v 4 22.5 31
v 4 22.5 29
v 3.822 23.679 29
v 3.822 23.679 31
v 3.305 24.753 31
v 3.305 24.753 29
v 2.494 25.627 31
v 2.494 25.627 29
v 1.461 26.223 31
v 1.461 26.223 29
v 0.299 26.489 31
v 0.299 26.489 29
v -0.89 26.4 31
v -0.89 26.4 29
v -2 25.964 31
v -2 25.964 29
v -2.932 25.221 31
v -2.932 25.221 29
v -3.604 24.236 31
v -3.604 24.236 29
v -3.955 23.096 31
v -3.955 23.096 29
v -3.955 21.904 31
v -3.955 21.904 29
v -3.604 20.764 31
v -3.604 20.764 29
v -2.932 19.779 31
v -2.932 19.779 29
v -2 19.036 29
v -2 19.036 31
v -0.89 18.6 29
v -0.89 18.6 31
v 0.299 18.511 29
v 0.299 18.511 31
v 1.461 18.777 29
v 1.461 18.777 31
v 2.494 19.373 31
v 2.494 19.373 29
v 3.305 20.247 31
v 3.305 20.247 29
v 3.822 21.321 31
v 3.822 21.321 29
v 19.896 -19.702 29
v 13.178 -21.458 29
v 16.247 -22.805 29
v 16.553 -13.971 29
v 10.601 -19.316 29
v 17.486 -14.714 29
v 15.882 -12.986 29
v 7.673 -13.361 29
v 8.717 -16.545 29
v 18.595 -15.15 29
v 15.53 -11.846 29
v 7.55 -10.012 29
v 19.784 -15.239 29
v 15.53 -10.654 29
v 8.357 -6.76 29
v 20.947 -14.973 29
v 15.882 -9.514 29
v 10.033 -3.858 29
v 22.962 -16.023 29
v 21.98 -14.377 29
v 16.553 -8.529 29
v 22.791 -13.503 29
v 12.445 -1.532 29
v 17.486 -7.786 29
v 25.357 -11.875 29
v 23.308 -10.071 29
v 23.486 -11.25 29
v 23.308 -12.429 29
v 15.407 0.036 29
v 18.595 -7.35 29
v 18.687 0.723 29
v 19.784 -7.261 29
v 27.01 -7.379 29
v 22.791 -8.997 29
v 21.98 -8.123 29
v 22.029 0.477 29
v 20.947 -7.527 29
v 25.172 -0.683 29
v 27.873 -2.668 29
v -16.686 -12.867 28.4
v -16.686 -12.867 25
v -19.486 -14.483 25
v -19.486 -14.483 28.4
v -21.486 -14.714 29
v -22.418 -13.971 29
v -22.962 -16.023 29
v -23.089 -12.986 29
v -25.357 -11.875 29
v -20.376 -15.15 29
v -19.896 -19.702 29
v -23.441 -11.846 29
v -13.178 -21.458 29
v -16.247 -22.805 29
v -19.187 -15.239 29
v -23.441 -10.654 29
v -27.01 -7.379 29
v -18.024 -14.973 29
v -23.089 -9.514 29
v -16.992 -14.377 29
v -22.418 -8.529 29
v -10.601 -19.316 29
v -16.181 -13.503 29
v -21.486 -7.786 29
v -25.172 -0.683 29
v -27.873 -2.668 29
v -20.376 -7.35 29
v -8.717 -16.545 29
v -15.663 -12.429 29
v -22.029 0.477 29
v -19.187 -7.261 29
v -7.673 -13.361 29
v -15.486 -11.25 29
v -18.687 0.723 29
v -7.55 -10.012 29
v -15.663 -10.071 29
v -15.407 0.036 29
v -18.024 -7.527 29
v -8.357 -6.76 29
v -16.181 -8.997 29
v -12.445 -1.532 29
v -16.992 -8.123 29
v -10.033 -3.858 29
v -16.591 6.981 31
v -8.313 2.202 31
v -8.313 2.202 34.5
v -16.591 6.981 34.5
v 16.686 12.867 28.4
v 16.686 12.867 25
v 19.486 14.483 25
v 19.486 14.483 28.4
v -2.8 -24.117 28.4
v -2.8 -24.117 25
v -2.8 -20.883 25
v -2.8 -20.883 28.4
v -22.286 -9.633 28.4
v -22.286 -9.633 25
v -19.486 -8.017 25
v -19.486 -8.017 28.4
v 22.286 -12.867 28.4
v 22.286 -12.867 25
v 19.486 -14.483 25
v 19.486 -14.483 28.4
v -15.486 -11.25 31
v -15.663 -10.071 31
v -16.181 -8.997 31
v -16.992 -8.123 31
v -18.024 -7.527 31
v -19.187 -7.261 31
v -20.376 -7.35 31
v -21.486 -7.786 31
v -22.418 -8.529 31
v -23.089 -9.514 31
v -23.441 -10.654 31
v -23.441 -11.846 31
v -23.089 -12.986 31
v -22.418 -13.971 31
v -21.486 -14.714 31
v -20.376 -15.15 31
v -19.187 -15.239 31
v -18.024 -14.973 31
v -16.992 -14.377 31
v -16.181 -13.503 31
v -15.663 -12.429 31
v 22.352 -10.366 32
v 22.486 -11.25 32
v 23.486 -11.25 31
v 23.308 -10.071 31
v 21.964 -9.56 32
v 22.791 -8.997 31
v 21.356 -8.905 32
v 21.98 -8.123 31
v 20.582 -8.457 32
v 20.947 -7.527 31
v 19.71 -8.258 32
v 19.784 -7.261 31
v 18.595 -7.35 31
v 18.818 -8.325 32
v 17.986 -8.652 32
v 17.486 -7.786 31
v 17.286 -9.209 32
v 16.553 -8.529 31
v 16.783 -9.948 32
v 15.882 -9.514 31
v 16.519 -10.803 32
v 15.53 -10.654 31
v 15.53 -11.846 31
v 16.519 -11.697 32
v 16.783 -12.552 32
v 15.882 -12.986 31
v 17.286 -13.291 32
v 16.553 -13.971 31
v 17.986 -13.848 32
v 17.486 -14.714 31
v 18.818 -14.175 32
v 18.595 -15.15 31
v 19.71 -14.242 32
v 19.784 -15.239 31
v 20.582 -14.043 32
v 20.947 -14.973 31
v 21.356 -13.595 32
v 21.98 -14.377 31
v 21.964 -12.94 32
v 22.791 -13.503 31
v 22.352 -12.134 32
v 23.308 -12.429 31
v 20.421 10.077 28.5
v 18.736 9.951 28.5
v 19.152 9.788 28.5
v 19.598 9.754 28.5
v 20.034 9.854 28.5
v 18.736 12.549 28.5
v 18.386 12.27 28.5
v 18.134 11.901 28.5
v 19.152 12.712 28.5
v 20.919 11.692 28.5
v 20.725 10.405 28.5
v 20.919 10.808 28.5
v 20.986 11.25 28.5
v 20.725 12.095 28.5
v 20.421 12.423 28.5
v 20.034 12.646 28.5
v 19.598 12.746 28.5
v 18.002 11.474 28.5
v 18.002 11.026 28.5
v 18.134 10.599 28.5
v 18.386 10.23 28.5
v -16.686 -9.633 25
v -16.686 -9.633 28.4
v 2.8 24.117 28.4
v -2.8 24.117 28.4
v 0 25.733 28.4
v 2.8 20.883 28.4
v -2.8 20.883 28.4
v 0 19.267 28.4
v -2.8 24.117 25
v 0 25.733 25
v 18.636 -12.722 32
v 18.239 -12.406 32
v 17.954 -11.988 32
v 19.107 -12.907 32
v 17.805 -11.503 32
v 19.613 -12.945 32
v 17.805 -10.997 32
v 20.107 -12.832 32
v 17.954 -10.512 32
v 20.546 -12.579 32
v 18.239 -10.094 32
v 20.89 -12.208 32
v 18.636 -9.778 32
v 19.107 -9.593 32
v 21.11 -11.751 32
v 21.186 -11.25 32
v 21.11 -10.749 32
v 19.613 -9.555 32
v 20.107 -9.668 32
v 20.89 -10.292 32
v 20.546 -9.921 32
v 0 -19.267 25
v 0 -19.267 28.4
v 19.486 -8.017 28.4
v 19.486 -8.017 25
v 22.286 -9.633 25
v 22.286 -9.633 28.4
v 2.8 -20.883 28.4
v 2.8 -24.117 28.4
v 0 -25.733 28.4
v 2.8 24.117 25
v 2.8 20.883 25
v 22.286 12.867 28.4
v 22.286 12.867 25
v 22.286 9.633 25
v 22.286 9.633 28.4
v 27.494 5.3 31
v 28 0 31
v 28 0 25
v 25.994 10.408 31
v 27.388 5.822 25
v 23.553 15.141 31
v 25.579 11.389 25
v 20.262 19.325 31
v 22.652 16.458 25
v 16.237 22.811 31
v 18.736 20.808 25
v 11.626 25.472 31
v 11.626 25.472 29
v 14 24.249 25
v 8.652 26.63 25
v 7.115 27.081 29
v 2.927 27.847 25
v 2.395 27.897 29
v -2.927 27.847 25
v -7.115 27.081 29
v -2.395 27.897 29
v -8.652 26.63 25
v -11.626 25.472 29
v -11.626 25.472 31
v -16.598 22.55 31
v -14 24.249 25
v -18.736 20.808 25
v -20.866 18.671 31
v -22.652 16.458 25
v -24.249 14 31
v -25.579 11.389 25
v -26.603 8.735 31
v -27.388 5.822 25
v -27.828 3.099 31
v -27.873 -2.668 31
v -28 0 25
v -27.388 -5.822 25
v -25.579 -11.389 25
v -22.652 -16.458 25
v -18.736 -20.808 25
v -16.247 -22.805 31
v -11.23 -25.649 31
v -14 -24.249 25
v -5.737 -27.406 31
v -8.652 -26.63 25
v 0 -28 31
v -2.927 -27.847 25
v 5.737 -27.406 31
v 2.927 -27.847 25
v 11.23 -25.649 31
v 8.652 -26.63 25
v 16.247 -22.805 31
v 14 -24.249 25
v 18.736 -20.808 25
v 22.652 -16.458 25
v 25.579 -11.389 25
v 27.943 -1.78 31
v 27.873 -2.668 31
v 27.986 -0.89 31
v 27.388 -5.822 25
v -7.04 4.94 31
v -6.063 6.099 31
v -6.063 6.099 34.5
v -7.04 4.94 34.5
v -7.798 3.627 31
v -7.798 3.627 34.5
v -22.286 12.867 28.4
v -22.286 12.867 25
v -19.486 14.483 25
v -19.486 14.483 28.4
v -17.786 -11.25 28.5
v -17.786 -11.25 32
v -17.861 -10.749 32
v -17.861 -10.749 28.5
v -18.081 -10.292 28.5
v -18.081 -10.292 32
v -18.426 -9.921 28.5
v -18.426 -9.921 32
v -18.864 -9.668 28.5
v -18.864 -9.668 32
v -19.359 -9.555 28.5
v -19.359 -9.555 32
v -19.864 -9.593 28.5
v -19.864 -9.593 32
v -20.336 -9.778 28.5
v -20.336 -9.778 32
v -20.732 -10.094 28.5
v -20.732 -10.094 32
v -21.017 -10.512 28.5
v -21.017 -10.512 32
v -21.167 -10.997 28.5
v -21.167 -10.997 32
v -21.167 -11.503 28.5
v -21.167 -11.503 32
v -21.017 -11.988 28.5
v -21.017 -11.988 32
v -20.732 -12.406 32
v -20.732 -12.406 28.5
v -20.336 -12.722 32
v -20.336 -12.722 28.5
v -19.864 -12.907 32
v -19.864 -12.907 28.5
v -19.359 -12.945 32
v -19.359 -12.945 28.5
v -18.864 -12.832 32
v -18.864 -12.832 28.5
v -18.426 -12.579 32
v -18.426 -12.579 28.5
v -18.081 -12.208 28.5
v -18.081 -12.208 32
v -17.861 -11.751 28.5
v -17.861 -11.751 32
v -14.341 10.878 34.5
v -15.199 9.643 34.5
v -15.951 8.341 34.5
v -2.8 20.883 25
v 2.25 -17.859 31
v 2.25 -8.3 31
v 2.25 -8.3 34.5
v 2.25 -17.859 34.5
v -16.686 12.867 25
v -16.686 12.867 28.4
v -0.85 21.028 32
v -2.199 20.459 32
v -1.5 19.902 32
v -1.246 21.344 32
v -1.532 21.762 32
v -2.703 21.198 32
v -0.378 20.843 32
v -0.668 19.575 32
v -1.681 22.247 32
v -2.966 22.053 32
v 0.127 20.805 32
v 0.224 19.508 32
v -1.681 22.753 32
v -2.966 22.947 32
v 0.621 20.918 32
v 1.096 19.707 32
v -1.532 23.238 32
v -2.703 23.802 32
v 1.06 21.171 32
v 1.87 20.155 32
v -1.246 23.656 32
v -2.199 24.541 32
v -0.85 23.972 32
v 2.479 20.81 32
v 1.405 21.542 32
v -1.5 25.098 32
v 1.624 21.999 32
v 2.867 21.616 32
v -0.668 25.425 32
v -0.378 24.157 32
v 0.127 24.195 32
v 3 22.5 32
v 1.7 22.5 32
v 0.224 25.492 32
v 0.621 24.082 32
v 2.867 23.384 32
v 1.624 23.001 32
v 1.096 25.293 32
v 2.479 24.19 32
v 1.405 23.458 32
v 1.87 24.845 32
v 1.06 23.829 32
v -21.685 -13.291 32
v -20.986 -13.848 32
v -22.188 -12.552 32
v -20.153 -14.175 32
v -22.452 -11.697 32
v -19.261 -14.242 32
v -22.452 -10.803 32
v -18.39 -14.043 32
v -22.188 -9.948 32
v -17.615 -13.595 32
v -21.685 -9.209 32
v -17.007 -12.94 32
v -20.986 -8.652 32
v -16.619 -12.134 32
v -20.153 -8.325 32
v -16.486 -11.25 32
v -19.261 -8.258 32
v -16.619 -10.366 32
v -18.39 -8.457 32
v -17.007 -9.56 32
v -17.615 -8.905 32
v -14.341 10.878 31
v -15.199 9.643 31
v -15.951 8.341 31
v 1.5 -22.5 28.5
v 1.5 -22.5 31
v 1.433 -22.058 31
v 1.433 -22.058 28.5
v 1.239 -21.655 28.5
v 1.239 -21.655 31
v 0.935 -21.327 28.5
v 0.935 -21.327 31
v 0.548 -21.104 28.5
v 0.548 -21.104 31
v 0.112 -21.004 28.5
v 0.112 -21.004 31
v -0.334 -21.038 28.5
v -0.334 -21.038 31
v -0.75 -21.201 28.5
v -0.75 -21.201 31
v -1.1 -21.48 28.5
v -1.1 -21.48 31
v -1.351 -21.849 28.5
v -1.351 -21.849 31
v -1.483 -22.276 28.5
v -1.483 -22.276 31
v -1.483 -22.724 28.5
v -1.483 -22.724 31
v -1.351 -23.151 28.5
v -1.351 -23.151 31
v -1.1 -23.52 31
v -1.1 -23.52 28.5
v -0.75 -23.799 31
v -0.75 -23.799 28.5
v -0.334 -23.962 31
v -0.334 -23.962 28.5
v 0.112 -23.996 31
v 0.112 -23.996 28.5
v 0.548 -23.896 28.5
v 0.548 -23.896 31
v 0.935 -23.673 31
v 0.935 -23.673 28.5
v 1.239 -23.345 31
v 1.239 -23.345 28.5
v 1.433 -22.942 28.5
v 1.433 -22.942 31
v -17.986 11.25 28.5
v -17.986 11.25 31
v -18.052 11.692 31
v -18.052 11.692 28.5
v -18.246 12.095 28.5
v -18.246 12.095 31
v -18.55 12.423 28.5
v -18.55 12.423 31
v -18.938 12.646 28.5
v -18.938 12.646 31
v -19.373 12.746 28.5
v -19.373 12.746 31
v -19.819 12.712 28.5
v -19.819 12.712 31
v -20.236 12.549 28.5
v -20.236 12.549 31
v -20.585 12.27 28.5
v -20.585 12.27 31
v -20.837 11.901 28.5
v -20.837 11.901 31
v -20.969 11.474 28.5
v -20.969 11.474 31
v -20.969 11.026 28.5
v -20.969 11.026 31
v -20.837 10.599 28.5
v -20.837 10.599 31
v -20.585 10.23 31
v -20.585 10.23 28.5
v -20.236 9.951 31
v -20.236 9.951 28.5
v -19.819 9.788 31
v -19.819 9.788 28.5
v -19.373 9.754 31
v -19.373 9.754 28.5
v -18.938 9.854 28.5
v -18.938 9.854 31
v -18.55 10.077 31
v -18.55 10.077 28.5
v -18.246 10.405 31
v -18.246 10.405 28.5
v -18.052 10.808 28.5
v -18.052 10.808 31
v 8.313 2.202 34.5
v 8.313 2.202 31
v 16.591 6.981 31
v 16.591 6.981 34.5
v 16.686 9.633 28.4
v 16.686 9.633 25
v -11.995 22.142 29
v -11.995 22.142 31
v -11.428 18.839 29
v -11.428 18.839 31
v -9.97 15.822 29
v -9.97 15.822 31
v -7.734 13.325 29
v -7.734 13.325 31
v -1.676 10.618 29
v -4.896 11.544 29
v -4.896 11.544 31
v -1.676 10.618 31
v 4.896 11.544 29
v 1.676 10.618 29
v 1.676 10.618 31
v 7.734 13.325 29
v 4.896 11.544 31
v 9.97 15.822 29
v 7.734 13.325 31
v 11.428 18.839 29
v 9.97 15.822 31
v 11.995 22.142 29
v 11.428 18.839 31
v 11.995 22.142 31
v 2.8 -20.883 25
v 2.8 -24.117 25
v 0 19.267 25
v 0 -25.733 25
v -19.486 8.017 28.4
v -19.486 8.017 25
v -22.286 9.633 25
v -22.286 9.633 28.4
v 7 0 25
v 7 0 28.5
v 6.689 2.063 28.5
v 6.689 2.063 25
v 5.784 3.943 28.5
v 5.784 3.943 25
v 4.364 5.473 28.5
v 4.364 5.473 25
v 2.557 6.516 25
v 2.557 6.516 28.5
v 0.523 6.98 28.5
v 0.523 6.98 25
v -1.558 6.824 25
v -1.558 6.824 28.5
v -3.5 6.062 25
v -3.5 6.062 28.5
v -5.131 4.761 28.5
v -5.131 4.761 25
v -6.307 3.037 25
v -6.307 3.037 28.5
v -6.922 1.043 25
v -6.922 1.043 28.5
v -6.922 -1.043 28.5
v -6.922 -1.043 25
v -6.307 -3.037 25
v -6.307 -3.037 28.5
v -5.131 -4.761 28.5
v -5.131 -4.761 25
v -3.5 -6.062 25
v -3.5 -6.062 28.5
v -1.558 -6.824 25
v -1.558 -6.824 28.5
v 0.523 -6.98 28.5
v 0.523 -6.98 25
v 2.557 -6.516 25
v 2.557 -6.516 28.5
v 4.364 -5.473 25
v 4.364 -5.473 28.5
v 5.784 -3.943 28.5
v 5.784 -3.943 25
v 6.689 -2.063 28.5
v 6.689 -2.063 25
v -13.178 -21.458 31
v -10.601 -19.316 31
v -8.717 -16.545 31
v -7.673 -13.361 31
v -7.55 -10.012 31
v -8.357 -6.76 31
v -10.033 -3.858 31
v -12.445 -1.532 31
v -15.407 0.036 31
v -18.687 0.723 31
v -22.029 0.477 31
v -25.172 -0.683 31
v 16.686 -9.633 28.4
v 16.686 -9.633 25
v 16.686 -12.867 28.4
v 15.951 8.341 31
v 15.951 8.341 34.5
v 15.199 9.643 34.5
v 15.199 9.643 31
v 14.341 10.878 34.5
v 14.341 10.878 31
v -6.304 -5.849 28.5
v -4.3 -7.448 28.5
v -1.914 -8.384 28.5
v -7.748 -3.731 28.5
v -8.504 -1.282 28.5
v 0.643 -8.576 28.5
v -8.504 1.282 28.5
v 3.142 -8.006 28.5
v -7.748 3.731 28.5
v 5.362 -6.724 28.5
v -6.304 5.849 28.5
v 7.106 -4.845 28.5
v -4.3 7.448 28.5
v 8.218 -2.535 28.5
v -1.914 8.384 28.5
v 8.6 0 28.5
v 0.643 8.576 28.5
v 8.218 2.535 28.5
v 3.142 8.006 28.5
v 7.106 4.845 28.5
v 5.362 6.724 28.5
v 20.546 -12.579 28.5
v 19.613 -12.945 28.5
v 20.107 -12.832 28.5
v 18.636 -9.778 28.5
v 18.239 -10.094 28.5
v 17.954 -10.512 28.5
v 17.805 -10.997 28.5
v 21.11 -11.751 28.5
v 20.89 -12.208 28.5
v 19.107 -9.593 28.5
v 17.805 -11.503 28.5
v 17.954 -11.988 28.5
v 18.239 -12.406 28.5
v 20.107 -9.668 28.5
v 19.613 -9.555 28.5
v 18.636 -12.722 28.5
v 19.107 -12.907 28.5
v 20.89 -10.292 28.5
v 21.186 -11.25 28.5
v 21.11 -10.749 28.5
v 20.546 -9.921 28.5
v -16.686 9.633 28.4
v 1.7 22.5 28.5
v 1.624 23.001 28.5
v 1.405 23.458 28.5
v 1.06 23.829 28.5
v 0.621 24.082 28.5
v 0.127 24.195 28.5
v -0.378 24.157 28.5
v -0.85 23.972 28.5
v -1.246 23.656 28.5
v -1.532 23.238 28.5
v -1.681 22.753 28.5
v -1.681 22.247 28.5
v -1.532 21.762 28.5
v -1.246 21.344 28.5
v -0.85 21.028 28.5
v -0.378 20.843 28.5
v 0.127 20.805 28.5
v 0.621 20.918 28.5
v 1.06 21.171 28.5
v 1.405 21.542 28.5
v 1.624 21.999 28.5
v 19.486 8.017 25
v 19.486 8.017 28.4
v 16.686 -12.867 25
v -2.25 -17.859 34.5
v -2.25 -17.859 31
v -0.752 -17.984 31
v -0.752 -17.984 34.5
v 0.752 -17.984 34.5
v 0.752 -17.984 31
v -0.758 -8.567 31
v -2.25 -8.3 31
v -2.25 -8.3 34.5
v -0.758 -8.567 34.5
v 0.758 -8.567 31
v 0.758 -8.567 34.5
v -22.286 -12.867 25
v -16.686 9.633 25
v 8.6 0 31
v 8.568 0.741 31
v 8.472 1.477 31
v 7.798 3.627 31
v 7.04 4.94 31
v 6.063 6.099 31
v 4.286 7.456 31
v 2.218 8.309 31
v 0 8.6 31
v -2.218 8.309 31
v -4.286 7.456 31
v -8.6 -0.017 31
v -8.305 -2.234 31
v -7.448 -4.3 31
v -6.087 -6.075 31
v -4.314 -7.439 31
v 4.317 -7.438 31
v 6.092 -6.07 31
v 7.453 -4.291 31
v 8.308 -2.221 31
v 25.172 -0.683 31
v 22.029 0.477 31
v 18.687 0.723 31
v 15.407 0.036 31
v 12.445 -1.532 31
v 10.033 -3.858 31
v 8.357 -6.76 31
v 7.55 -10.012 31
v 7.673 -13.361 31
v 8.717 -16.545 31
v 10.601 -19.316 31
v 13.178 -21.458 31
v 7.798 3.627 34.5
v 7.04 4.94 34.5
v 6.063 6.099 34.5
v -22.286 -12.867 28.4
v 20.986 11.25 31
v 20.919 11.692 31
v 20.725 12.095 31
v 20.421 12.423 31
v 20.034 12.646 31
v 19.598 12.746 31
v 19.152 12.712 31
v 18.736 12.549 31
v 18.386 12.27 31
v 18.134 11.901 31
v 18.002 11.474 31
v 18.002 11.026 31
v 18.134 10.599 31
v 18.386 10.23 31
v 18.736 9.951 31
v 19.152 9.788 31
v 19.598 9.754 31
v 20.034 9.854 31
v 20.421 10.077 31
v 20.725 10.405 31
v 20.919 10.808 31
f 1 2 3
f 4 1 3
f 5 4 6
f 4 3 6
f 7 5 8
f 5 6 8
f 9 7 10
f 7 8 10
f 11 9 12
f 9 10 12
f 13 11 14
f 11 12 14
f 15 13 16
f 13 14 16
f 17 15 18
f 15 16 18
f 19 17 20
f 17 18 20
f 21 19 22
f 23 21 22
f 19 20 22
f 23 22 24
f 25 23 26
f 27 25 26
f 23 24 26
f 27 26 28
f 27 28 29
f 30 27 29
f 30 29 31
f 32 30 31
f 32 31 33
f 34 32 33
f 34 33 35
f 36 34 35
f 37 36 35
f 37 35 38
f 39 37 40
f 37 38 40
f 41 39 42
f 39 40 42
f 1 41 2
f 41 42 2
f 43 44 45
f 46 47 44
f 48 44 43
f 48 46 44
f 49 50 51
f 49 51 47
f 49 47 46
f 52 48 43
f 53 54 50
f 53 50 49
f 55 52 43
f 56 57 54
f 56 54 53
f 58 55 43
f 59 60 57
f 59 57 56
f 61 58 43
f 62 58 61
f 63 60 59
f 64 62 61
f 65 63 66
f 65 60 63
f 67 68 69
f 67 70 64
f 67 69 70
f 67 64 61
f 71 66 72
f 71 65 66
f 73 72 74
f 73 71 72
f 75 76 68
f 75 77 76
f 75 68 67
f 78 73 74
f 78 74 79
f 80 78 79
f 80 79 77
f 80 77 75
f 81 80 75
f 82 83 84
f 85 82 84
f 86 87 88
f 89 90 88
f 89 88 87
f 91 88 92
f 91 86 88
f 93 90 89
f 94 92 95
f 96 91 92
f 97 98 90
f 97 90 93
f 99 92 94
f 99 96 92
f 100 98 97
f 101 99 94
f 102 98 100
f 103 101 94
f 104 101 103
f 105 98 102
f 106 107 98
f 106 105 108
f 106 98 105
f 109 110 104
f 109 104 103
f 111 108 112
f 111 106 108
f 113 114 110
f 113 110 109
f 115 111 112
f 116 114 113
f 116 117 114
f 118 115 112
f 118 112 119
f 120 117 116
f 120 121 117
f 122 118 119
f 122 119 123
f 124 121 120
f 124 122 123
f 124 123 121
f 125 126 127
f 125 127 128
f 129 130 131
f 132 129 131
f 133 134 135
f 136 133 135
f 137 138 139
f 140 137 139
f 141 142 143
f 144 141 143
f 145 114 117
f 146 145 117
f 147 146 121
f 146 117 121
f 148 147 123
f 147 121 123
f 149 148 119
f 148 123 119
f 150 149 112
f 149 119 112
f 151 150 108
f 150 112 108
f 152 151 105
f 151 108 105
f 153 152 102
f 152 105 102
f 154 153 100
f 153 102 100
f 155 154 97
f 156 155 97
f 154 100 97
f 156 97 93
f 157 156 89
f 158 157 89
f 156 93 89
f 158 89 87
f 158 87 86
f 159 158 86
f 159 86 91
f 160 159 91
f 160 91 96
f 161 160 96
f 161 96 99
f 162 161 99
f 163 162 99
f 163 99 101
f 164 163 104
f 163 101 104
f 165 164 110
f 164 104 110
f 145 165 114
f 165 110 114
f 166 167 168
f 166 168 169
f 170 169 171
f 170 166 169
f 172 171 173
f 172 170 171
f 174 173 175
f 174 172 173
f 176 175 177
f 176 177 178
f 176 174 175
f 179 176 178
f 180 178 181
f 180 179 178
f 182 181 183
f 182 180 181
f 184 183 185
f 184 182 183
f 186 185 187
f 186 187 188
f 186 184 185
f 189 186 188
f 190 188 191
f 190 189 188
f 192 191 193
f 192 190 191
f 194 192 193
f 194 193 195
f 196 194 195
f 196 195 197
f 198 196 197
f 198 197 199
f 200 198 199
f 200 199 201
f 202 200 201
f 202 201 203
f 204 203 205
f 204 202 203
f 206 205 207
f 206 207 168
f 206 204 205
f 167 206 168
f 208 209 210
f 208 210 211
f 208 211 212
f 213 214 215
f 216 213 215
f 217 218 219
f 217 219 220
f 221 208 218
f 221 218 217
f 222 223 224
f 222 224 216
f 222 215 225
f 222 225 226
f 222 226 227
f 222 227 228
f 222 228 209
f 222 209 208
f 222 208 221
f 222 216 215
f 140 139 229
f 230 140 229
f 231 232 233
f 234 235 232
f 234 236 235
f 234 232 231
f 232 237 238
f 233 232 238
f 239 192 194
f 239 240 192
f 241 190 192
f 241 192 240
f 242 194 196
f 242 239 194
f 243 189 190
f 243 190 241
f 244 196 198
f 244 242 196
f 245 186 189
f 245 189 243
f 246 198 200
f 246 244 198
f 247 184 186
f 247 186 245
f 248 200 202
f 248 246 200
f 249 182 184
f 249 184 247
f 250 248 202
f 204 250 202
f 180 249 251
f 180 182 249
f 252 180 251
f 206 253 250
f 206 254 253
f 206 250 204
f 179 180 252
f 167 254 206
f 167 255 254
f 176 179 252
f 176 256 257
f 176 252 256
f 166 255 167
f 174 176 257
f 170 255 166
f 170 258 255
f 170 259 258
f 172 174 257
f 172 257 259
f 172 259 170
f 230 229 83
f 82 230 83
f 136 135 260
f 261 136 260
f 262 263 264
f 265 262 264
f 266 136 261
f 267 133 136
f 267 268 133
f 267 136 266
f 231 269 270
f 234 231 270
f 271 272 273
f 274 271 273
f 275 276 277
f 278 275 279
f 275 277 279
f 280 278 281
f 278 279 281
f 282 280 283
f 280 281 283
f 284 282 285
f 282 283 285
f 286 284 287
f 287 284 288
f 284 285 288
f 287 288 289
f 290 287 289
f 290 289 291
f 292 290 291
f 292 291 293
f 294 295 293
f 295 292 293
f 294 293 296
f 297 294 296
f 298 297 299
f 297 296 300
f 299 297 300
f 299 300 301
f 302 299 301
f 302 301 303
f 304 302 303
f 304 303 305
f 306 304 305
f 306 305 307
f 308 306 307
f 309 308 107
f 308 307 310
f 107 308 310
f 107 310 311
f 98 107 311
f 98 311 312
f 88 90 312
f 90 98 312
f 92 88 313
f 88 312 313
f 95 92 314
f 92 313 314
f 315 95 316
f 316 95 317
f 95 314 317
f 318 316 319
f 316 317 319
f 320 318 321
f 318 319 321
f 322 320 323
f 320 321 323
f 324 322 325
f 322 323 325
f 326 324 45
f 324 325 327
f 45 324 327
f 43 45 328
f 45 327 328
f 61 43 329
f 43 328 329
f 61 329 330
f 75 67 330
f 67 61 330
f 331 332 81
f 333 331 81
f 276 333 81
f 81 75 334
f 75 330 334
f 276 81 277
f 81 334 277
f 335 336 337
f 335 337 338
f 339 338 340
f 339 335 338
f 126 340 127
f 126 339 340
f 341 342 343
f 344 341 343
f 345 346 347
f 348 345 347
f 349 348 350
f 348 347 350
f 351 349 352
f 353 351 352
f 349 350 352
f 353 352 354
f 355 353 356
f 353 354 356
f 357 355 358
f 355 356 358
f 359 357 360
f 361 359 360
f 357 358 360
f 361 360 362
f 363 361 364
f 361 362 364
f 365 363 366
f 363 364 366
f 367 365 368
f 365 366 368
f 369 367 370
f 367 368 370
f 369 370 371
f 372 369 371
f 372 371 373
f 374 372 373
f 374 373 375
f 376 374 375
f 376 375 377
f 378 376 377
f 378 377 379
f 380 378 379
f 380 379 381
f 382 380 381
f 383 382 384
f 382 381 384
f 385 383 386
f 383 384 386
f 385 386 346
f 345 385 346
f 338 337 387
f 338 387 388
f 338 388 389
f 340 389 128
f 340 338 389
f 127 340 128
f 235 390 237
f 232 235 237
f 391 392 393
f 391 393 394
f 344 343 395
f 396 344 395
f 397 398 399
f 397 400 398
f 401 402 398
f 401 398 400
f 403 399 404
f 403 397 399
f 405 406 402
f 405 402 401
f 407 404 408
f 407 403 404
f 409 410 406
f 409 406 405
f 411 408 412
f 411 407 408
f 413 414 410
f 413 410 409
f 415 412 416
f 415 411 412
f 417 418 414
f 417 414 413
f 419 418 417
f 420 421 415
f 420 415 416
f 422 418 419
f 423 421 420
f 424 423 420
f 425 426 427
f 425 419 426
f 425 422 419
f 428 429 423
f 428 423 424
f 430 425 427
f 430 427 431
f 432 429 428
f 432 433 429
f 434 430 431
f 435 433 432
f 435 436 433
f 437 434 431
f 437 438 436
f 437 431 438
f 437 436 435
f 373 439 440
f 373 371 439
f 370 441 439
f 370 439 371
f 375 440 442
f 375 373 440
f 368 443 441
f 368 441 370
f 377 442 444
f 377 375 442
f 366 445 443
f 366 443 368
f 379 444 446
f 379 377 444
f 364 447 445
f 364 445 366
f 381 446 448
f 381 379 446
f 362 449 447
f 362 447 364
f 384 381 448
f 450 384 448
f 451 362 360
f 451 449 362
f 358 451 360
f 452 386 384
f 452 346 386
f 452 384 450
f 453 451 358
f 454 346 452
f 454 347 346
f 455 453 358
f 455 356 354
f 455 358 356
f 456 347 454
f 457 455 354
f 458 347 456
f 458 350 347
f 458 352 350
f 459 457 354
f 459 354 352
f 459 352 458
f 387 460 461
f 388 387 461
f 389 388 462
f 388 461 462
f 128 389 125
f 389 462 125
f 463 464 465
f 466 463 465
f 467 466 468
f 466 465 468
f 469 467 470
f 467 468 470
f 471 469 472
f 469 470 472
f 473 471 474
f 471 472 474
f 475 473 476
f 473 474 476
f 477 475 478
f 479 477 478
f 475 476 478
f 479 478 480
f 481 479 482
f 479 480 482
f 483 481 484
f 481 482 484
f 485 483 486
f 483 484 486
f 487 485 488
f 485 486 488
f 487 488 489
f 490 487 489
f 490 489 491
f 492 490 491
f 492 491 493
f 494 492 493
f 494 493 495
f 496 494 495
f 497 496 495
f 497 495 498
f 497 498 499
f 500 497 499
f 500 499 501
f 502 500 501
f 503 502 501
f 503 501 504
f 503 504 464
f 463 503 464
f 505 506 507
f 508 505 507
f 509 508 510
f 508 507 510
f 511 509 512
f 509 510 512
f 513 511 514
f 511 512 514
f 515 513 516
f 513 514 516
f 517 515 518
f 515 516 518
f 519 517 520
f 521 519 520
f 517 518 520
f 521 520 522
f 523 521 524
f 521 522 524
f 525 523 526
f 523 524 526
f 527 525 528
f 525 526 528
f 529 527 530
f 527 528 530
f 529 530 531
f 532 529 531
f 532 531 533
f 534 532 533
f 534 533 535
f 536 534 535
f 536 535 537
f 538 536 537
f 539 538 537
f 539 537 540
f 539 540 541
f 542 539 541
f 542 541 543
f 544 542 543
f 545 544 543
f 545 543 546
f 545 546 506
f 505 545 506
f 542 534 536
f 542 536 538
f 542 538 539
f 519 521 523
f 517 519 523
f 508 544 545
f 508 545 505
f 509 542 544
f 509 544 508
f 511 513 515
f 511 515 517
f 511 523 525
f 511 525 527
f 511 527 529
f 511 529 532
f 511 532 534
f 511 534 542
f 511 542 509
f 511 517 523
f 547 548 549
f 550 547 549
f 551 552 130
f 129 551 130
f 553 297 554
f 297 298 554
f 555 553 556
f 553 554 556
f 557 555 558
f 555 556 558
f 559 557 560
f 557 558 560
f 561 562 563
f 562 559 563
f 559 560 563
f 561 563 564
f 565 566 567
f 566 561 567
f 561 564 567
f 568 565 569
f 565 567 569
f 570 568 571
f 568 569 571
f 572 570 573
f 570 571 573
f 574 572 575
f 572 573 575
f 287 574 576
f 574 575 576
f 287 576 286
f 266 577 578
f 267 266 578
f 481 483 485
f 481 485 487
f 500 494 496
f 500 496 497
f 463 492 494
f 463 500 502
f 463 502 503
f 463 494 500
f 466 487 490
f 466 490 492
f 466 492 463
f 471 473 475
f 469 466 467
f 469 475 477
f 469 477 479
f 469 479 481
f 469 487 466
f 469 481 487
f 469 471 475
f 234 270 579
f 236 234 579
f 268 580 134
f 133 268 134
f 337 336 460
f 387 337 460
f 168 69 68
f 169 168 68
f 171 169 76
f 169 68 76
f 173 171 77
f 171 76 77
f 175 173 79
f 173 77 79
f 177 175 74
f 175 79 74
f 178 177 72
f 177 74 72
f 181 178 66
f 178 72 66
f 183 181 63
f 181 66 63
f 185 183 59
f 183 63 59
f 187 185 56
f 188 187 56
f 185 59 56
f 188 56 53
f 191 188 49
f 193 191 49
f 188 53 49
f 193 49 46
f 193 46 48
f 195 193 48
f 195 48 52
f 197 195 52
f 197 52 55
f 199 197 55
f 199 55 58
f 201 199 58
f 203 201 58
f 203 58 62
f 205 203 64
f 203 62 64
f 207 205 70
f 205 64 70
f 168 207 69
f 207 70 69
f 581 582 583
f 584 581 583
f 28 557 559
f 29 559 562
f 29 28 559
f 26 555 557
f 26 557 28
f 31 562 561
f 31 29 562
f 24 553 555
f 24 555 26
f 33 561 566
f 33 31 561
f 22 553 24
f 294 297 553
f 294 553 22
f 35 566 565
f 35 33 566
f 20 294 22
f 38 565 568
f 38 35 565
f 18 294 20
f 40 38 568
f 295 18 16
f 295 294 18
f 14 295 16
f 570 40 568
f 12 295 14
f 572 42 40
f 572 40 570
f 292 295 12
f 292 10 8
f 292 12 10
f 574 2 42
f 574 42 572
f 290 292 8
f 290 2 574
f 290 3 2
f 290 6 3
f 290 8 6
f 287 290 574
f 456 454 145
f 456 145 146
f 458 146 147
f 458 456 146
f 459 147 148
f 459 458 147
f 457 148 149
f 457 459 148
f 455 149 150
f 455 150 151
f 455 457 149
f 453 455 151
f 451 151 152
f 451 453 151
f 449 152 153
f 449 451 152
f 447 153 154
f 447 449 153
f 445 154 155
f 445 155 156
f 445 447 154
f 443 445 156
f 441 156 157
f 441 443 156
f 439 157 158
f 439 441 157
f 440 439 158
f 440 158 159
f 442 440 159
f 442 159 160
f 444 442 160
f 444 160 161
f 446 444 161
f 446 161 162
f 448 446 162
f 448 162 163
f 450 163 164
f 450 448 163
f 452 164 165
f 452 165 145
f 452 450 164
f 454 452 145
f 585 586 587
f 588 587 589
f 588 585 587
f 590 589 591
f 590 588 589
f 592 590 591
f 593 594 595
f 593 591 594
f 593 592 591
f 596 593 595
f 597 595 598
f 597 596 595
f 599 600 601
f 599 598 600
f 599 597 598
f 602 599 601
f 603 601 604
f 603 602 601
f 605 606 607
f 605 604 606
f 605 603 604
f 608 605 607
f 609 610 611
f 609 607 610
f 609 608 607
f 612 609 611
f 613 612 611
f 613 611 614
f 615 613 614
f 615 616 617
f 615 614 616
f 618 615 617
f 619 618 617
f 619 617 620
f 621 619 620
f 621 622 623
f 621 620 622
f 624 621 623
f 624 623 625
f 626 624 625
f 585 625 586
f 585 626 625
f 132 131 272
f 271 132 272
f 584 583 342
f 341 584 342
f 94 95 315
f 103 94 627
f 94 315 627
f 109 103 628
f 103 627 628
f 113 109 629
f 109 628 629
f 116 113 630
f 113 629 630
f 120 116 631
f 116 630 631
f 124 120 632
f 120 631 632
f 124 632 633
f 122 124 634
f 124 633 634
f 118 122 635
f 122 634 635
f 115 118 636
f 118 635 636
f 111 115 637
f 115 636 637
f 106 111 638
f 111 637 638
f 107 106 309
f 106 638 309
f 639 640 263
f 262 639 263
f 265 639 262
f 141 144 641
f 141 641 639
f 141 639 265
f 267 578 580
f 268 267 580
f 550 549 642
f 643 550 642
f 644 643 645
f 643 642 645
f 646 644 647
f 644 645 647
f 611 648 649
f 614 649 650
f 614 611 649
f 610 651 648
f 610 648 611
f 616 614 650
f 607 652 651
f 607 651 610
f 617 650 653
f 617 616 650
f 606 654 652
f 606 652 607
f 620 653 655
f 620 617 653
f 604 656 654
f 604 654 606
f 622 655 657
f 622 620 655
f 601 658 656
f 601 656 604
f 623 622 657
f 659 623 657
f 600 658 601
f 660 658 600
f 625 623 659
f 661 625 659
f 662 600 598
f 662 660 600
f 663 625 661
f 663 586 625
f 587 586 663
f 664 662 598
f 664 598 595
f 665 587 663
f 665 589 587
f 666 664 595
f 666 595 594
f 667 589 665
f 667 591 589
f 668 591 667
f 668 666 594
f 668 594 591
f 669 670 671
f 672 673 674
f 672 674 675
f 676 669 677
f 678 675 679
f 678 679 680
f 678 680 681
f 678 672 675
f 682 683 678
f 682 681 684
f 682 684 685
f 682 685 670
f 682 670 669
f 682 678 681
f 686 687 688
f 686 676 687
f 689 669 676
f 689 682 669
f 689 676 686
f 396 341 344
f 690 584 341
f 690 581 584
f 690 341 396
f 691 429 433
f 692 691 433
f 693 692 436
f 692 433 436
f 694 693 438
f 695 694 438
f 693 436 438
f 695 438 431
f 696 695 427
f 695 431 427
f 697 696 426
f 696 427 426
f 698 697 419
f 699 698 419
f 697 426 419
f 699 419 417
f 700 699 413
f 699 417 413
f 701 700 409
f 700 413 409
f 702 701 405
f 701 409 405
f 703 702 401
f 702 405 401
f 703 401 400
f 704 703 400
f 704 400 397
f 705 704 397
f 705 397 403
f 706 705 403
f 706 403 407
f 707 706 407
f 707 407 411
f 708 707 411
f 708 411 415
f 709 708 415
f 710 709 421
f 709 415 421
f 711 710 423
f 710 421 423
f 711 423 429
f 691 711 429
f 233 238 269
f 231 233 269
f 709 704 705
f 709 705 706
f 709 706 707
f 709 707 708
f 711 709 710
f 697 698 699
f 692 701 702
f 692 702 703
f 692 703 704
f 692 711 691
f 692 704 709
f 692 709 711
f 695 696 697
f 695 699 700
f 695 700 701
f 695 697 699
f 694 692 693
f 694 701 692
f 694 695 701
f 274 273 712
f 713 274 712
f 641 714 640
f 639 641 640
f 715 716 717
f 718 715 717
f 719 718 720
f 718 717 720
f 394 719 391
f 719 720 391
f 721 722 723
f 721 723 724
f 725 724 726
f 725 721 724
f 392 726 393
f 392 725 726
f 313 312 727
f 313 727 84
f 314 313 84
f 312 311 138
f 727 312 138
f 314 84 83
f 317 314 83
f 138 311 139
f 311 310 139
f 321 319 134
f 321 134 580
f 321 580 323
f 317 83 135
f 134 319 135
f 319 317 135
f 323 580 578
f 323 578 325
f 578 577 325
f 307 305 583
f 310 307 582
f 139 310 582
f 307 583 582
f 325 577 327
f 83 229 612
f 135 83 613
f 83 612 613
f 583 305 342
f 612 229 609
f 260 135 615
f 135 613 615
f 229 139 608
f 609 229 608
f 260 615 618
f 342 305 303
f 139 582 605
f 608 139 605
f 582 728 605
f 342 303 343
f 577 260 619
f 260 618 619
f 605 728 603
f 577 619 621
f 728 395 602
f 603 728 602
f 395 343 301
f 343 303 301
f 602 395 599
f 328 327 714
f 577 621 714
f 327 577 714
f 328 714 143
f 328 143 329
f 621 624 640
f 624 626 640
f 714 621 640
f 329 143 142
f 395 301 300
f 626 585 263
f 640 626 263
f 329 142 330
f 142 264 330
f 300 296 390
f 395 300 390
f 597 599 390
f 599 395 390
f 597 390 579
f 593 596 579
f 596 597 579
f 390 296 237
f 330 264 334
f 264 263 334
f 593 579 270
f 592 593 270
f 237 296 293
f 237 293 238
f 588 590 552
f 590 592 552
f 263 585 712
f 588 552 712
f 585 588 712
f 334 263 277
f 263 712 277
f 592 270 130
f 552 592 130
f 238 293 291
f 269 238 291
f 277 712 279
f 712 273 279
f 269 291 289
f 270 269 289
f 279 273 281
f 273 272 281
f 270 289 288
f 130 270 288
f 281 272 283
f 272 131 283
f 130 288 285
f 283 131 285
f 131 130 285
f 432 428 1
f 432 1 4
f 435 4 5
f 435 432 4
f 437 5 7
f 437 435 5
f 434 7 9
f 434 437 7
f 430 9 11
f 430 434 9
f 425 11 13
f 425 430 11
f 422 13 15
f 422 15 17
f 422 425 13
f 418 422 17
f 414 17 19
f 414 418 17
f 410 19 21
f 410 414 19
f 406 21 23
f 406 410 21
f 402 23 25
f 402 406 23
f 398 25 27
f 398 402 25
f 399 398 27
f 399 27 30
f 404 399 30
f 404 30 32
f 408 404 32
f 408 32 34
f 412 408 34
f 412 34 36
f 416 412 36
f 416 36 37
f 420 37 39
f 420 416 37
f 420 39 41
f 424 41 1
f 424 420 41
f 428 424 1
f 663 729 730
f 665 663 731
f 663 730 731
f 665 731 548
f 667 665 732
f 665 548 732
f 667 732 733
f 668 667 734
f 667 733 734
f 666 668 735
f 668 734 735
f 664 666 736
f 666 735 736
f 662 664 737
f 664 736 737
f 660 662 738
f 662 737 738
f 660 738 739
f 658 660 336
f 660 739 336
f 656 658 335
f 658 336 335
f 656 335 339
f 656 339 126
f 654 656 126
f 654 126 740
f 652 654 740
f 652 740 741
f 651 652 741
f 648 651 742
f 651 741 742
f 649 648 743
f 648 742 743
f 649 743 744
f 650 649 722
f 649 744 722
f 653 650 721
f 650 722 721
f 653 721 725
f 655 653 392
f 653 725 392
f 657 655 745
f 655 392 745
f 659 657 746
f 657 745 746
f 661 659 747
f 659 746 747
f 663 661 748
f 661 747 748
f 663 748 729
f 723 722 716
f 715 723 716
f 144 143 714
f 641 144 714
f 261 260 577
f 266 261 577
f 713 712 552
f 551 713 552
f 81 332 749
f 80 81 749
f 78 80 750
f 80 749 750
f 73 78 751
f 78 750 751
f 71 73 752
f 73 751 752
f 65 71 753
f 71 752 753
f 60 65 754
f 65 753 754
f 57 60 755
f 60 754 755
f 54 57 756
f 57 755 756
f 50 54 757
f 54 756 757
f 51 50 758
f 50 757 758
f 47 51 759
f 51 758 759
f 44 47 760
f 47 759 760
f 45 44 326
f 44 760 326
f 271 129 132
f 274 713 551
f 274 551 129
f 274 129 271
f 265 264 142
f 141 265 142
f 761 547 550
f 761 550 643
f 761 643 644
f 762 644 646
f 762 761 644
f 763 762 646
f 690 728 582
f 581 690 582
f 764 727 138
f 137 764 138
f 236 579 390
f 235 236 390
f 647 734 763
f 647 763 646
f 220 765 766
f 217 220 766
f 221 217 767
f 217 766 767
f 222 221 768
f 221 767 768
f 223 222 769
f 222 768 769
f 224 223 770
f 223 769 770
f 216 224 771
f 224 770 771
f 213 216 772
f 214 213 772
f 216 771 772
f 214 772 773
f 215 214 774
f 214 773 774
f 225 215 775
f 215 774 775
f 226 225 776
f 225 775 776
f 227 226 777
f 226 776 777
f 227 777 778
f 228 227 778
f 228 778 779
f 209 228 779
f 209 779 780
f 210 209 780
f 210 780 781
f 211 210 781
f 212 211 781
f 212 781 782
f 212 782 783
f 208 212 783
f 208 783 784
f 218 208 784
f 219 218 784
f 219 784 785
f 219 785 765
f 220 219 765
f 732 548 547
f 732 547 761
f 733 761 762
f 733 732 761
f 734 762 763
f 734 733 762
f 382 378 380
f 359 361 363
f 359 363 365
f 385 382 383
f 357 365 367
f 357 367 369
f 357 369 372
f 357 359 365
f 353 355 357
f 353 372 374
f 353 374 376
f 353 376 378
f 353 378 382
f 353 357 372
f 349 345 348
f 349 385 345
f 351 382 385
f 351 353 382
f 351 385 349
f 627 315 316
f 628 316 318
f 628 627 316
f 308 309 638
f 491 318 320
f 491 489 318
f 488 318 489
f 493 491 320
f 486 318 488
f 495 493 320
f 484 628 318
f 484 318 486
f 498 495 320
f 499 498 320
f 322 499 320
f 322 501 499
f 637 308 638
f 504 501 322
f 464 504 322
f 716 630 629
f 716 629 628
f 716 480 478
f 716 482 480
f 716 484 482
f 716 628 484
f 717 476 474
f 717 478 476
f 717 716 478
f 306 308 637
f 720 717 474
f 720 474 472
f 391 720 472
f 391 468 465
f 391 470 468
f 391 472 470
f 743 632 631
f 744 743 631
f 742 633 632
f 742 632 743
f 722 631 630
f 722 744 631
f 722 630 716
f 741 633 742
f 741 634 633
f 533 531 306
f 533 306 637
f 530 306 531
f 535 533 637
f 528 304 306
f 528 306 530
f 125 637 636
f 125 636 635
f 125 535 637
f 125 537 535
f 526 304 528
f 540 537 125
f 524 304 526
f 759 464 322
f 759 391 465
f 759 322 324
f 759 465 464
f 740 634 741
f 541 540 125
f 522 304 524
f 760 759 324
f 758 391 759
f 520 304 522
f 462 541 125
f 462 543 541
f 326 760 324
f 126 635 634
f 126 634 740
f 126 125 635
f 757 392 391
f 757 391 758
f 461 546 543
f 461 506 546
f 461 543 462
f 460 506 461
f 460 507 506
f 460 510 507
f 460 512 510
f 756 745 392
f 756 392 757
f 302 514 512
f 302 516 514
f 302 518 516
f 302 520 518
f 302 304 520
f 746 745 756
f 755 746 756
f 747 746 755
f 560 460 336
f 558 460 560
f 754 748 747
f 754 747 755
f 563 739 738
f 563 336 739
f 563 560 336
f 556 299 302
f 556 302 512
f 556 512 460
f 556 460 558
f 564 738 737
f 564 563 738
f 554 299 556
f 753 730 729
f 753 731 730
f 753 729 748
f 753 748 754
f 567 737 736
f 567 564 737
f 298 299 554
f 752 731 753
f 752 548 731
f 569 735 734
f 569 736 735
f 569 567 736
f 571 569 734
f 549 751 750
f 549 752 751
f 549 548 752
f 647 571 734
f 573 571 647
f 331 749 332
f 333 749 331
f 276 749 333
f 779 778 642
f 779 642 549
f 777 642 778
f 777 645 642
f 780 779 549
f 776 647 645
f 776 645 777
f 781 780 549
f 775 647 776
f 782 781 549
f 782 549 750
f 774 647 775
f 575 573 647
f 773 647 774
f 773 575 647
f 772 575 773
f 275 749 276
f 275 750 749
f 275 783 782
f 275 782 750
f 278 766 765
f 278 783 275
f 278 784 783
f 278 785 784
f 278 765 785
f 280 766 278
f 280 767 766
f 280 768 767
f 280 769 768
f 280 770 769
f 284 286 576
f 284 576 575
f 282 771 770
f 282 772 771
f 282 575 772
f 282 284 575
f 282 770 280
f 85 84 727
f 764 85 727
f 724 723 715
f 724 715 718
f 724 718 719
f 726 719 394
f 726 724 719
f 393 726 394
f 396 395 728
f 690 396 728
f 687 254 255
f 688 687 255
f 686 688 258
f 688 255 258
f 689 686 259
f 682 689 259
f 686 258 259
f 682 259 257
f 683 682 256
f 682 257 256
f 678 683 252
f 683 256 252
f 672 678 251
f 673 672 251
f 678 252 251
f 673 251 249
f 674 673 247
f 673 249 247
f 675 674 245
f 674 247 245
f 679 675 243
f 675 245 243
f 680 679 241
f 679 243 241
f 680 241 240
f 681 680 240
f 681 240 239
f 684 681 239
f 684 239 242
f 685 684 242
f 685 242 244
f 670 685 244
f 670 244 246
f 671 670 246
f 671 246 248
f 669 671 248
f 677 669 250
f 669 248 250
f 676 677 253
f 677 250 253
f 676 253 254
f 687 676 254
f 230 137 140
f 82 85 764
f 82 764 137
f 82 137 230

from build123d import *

# Parameters (mm, degrees)
SKETCH_R           = 28
SKETCH_R_2         = 7
PAD_DEPTH          = 6
SKETCH007_R        = 12
SKETCH007_R_2      = 8.6
POCKET002_DEPTH    = 2
SKETCH001_R        = 4
PAD001_DEPTH       = 3
PAD002_DEPTH       = 3.5
POLARPATTERN_COUNT = 3
SKETCH003_R        = 1.7
SKETCH003_R_2      = 1.5
POCKET001_DEPTH    = 3.5
POCKET_DEPTH       = 3.4
CHAMFER_SIZE       = 1
CHAMFER001_SIZE    = 1
CHAMFER002_SIZE    = 1
SKETCH008_R        = 8.6
POCKET003_DEPTH    = 2.5


with BuildPart() as part:
    # Sketch → Pad (new body)
    with BuildSketch(Plane.XY.offset(25)):
        Circle(SKETCH_R)
        Circle(SKETCH_R_2, mode=Mode.SUBTRACT)
    extrude(amount=PAD_DEPTH)

    # Sketch007 → Pocket002 (cut)
    with BuildSketch(Plane.XY.offset(31)):
        with Locations((0, 22.5)):
            Circle(SKETCH007_R)
        with Locations((-19.485572, -11.25)):
            Circle(SKETCH007_R)
        with Locations((19.485572, -11.25)):
            Circle(SKETCH007_R)
        Circle(SKETCH007_R_2)
    extrude(amount=-POCKET002_DEPTH, mode=Mode.SUBTRACT)

    # Sketch001 → Pad001 (new body)
    with BuildSketch(Plane.XY.offset(29)):
        with Locations((0, 22.5)):
            Circle(SKETCH001_R)
        with Locations((-19.485572, -11.25)):
            Circle(SKETCH001_R)
        with Locations((19.485572, -11.25)):
            Circle(SKETCH001_R)
    extrude(amount=PAD001_DEPTH)

    # Sketch005 → Pad002 (new body)
    with BuildSketch(Plane.XY.offset(31)):
        with BuildLine():
            Line((-2.25, -8.300452), (-2.25, -17.858821))
            ThreePointArc((-2.25, -17.858821), (0, -18), (2.25, -17.858821))
            Line((2.25, -8.300452), (2.25, -17.858821))
            ThreePointArc((-2.25, -8.300452), (0, -8.6), (2.25, -8.300452))
        make_face()
    pad002 = extrude(amount=PAD002_DEPTH)

    # PolarPattern: Pad002 ×3 about axis
    polarpattern_axis = Axis((0, 0, 31), (0, 0, 1))
    for i in range(1, POLARPATTERN_COUNT):
        add(pad002.rotate(polarpattern_axis, i * 360 / POLARPATTERN_COUNT))

    # Sketch003 → Pocket001 (cut)
    with BuildSketch(Plane.XY.offset(32)):
        with Locations((0, 22.5)):
            Circle(SKETCH003_R)
        with Locations((-19.485572, -11.25)):
            Circle(SKETCH003_R)
        with Locations((19.485572, -11.25)):
            Circle(SKETCH003_R)
        with Locations((-19.485572, 11.25)):
            Circle(SKETCH003_R_2)
        with Locations((19.485572, 11.25)):
            Circle(SKETCH003_R_2)
        with Locations((0, -22.5)):
            Circle(SKETCH003_R_2)
    extrude(amount=-POCKET001_DEPTH, mode=Mode.SUBTRACT)

    # Sketch004 → Pocket (cut)
    with BuildSketch(Plane(origin=(0, 0, 25), x_dir=(1, 0, 0), z_dir=(0, 0, -1))):
        Polygon((-16.685572, 9.633419), (-16.685572, 12.866581), (-19.485572, 14.483162), (-22.285572, 12.866581), (-22.285572, 9.633419), (-19.485572, 8.016838), align=None)
        Polygon((-2.8, 24.116581), (-2.8, 20.883419), (0, 19.266838), (2.8, 20.883419), (2.8, 24.116581), (0, 25.733162), align=None)
        Polygon((19.485572, 14.483162), (16.685572, 12.866581), (16.685572, 9.633419), (19.485572, 8.016838), (22.285572, 9.633419), (22.285572, 12.866581), align=None)
        Polygon((19.485572, -8.016838), (16.685572, -9.633419), (16.685572, -12.866581), (19.485572, -14.483162), (22.285572, -12.866581), (22.285572, -9.633419), align=None)
        Polygon((-22.285572, -9.633419), (-22.285572, -12.866581), (-19.485572, -14.483162), (-16.685572, -12.866581), (-16.685572, -9.633419), (-19.485572, -8.016838), align=None)
        Polygon((-2.8, -20.883419), (-2.8, -24.116581), (0, -25.733162), (2.8, -24.116581), (2.8, -20.883419), (0, -19.266838), align=None)
    extrude(amount=-POCKET_DEPTH, mode=Mode.SUBTRACT)

    # Chamfer
    chamfer_edges = [part.edges().sort_by_distance(p)[0] for p in [
        (15.485572, -11.25, 32),
    ]]
    chamfer(chamfer_edges, length=CHAMFER_SIZE)

    # Chamfer001
    chamfer001_edges = [part.edges().sort_by_distance(p)[0] for p in [
        (-23.485572, -11.25, 32),
    ]]
    chamfer(chamfer001_edges, length=CHAMFER001_SIZE)

    # Chamfer002
    chamfer002_edges = [part.edges().sort_by_distance(p)[0] for p in [
        (-4, 22.5, 32),
    ]]
    chamfer(chamfer002_edges, length=CHAMFER002_SIZE)

    # Sketch008 → Pocket003 (cut)
    with BuildSketch(Plane.XY.offset(31)):
        Circle(SKETCH008_R)
    extrude(amount=-POCKET003_DEPTH, mode=Mode.SUBTRACT)


solid = part.part
